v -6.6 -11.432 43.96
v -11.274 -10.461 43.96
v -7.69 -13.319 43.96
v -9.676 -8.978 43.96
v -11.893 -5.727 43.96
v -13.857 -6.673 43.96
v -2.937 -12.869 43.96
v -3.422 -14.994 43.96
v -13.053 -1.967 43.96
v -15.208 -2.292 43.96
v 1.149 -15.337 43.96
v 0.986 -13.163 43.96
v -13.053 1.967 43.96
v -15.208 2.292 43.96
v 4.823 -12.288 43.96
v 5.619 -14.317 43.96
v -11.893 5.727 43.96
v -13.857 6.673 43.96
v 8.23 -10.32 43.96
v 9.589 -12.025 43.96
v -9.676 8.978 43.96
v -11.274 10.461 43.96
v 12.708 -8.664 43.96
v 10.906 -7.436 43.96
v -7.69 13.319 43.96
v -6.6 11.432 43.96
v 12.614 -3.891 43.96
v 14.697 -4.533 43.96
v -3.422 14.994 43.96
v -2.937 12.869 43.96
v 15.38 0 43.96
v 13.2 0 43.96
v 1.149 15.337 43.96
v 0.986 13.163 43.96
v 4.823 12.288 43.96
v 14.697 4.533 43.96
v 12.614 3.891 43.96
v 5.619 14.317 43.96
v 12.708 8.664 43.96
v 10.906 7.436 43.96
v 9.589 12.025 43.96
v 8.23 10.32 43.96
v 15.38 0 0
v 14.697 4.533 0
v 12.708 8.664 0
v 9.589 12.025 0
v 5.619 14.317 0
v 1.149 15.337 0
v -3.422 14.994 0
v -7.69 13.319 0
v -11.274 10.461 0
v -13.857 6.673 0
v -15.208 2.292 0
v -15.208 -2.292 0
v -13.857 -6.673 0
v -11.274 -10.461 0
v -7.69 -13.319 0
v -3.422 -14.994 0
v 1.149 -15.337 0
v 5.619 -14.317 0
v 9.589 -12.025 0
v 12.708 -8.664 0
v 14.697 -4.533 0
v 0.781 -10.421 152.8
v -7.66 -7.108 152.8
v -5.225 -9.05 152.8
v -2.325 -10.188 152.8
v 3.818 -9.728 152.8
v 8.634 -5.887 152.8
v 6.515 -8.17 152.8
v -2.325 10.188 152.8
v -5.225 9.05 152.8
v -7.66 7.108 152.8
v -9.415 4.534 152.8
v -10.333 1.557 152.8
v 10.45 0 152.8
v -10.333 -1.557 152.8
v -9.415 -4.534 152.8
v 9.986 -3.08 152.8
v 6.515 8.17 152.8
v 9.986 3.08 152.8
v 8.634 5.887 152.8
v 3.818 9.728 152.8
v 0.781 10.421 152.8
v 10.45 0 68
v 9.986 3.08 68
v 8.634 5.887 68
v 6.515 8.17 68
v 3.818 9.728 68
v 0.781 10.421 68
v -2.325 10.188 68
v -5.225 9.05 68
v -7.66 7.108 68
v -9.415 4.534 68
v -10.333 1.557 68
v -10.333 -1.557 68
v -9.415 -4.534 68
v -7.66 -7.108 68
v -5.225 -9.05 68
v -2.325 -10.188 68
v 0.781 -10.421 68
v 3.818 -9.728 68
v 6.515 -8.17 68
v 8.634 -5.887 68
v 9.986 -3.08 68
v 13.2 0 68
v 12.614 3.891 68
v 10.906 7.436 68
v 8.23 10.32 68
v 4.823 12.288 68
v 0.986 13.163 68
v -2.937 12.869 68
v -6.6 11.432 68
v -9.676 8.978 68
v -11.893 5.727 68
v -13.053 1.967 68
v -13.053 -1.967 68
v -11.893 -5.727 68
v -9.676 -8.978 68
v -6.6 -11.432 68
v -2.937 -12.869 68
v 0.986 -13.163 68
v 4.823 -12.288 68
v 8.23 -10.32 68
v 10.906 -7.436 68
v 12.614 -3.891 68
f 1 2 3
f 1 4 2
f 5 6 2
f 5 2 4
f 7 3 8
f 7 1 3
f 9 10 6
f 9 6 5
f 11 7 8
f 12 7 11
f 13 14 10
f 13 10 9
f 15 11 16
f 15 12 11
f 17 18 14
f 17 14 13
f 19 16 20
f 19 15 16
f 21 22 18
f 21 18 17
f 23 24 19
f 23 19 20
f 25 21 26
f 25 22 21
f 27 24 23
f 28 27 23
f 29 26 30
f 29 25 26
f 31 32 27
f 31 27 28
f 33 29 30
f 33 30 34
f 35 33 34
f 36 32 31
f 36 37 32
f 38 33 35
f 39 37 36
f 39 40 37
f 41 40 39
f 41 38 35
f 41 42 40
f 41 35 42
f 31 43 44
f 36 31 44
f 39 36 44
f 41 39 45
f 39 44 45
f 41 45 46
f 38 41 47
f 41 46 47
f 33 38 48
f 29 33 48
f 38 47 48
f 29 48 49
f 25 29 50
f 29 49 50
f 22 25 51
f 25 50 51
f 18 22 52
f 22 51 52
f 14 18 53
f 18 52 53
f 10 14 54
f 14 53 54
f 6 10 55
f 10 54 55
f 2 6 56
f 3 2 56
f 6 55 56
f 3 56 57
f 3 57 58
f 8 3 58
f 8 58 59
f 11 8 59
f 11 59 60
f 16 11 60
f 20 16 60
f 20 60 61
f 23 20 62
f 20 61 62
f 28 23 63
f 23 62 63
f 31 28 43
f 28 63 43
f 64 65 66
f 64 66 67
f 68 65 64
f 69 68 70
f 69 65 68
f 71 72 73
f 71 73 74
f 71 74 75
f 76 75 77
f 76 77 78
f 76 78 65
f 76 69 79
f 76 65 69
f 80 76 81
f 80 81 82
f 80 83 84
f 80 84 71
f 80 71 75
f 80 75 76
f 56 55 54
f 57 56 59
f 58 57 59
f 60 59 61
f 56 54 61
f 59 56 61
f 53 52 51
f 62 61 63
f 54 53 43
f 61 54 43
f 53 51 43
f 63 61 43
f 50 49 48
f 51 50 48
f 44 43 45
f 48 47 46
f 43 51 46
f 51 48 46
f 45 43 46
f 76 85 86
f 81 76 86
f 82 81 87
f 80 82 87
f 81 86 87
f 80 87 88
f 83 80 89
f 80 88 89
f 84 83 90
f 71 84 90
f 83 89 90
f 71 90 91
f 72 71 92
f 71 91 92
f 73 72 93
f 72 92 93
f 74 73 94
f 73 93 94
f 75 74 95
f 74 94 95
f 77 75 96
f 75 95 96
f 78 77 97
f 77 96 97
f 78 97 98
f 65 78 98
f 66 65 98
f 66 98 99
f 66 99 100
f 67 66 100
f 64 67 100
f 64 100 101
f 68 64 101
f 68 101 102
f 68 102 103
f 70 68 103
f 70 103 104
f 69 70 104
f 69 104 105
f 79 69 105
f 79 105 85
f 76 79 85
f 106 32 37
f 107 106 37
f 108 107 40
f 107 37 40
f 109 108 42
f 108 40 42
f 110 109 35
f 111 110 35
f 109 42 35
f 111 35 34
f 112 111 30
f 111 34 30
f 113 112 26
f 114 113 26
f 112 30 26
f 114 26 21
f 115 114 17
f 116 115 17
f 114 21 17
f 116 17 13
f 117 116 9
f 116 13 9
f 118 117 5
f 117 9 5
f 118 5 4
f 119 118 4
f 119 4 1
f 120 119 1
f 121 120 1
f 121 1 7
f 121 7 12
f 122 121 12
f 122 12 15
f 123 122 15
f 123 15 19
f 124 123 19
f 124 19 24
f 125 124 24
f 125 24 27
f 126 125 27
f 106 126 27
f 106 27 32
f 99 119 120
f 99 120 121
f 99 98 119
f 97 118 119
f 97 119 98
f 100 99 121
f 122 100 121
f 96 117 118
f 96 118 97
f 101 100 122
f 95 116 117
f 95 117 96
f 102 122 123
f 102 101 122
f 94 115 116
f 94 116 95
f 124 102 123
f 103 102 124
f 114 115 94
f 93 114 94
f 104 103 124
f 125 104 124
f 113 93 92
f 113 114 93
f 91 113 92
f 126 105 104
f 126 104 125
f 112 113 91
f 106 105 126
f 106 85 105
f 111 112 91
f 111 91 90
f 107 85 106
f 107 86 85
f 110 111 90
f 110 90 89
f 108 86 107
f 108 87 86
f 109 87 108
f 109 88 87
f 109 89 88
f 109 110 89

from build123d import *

# Parameters (mm, degrees)
F0_R     = 15.38
F0_R_2   = 13.2
F1_DEPTH = 43.96
F0_R_3   = 10.45
F3_DEPTH = 68
F2_DEPTH = 152.8


with BuildPart() as f1:
    # F0 (on Top) → F1 (new body)
    with BuildSketch(Plane.XY):
        Circle(F0_R)
        Circle(F0_R_2, mode=Mode.SUBTRACT)
    extrude(amount=F1_DEPTH)

    # F0 (on Top) → F3 (join)
    with BuildSketch(Plane.XY):
        Circle(F0_R_2)
        Circle(F0_R_3, mode=Mode.SUBTRACT)
    extrude(amount=F3_DEPTH)

    # F0 (on Top) → F2 (join)
    with BuildSketch(Plane.XY):
        Circle(F0_R_3)
    extrude(amount=F2_DEPTH)


solid = f1.part
